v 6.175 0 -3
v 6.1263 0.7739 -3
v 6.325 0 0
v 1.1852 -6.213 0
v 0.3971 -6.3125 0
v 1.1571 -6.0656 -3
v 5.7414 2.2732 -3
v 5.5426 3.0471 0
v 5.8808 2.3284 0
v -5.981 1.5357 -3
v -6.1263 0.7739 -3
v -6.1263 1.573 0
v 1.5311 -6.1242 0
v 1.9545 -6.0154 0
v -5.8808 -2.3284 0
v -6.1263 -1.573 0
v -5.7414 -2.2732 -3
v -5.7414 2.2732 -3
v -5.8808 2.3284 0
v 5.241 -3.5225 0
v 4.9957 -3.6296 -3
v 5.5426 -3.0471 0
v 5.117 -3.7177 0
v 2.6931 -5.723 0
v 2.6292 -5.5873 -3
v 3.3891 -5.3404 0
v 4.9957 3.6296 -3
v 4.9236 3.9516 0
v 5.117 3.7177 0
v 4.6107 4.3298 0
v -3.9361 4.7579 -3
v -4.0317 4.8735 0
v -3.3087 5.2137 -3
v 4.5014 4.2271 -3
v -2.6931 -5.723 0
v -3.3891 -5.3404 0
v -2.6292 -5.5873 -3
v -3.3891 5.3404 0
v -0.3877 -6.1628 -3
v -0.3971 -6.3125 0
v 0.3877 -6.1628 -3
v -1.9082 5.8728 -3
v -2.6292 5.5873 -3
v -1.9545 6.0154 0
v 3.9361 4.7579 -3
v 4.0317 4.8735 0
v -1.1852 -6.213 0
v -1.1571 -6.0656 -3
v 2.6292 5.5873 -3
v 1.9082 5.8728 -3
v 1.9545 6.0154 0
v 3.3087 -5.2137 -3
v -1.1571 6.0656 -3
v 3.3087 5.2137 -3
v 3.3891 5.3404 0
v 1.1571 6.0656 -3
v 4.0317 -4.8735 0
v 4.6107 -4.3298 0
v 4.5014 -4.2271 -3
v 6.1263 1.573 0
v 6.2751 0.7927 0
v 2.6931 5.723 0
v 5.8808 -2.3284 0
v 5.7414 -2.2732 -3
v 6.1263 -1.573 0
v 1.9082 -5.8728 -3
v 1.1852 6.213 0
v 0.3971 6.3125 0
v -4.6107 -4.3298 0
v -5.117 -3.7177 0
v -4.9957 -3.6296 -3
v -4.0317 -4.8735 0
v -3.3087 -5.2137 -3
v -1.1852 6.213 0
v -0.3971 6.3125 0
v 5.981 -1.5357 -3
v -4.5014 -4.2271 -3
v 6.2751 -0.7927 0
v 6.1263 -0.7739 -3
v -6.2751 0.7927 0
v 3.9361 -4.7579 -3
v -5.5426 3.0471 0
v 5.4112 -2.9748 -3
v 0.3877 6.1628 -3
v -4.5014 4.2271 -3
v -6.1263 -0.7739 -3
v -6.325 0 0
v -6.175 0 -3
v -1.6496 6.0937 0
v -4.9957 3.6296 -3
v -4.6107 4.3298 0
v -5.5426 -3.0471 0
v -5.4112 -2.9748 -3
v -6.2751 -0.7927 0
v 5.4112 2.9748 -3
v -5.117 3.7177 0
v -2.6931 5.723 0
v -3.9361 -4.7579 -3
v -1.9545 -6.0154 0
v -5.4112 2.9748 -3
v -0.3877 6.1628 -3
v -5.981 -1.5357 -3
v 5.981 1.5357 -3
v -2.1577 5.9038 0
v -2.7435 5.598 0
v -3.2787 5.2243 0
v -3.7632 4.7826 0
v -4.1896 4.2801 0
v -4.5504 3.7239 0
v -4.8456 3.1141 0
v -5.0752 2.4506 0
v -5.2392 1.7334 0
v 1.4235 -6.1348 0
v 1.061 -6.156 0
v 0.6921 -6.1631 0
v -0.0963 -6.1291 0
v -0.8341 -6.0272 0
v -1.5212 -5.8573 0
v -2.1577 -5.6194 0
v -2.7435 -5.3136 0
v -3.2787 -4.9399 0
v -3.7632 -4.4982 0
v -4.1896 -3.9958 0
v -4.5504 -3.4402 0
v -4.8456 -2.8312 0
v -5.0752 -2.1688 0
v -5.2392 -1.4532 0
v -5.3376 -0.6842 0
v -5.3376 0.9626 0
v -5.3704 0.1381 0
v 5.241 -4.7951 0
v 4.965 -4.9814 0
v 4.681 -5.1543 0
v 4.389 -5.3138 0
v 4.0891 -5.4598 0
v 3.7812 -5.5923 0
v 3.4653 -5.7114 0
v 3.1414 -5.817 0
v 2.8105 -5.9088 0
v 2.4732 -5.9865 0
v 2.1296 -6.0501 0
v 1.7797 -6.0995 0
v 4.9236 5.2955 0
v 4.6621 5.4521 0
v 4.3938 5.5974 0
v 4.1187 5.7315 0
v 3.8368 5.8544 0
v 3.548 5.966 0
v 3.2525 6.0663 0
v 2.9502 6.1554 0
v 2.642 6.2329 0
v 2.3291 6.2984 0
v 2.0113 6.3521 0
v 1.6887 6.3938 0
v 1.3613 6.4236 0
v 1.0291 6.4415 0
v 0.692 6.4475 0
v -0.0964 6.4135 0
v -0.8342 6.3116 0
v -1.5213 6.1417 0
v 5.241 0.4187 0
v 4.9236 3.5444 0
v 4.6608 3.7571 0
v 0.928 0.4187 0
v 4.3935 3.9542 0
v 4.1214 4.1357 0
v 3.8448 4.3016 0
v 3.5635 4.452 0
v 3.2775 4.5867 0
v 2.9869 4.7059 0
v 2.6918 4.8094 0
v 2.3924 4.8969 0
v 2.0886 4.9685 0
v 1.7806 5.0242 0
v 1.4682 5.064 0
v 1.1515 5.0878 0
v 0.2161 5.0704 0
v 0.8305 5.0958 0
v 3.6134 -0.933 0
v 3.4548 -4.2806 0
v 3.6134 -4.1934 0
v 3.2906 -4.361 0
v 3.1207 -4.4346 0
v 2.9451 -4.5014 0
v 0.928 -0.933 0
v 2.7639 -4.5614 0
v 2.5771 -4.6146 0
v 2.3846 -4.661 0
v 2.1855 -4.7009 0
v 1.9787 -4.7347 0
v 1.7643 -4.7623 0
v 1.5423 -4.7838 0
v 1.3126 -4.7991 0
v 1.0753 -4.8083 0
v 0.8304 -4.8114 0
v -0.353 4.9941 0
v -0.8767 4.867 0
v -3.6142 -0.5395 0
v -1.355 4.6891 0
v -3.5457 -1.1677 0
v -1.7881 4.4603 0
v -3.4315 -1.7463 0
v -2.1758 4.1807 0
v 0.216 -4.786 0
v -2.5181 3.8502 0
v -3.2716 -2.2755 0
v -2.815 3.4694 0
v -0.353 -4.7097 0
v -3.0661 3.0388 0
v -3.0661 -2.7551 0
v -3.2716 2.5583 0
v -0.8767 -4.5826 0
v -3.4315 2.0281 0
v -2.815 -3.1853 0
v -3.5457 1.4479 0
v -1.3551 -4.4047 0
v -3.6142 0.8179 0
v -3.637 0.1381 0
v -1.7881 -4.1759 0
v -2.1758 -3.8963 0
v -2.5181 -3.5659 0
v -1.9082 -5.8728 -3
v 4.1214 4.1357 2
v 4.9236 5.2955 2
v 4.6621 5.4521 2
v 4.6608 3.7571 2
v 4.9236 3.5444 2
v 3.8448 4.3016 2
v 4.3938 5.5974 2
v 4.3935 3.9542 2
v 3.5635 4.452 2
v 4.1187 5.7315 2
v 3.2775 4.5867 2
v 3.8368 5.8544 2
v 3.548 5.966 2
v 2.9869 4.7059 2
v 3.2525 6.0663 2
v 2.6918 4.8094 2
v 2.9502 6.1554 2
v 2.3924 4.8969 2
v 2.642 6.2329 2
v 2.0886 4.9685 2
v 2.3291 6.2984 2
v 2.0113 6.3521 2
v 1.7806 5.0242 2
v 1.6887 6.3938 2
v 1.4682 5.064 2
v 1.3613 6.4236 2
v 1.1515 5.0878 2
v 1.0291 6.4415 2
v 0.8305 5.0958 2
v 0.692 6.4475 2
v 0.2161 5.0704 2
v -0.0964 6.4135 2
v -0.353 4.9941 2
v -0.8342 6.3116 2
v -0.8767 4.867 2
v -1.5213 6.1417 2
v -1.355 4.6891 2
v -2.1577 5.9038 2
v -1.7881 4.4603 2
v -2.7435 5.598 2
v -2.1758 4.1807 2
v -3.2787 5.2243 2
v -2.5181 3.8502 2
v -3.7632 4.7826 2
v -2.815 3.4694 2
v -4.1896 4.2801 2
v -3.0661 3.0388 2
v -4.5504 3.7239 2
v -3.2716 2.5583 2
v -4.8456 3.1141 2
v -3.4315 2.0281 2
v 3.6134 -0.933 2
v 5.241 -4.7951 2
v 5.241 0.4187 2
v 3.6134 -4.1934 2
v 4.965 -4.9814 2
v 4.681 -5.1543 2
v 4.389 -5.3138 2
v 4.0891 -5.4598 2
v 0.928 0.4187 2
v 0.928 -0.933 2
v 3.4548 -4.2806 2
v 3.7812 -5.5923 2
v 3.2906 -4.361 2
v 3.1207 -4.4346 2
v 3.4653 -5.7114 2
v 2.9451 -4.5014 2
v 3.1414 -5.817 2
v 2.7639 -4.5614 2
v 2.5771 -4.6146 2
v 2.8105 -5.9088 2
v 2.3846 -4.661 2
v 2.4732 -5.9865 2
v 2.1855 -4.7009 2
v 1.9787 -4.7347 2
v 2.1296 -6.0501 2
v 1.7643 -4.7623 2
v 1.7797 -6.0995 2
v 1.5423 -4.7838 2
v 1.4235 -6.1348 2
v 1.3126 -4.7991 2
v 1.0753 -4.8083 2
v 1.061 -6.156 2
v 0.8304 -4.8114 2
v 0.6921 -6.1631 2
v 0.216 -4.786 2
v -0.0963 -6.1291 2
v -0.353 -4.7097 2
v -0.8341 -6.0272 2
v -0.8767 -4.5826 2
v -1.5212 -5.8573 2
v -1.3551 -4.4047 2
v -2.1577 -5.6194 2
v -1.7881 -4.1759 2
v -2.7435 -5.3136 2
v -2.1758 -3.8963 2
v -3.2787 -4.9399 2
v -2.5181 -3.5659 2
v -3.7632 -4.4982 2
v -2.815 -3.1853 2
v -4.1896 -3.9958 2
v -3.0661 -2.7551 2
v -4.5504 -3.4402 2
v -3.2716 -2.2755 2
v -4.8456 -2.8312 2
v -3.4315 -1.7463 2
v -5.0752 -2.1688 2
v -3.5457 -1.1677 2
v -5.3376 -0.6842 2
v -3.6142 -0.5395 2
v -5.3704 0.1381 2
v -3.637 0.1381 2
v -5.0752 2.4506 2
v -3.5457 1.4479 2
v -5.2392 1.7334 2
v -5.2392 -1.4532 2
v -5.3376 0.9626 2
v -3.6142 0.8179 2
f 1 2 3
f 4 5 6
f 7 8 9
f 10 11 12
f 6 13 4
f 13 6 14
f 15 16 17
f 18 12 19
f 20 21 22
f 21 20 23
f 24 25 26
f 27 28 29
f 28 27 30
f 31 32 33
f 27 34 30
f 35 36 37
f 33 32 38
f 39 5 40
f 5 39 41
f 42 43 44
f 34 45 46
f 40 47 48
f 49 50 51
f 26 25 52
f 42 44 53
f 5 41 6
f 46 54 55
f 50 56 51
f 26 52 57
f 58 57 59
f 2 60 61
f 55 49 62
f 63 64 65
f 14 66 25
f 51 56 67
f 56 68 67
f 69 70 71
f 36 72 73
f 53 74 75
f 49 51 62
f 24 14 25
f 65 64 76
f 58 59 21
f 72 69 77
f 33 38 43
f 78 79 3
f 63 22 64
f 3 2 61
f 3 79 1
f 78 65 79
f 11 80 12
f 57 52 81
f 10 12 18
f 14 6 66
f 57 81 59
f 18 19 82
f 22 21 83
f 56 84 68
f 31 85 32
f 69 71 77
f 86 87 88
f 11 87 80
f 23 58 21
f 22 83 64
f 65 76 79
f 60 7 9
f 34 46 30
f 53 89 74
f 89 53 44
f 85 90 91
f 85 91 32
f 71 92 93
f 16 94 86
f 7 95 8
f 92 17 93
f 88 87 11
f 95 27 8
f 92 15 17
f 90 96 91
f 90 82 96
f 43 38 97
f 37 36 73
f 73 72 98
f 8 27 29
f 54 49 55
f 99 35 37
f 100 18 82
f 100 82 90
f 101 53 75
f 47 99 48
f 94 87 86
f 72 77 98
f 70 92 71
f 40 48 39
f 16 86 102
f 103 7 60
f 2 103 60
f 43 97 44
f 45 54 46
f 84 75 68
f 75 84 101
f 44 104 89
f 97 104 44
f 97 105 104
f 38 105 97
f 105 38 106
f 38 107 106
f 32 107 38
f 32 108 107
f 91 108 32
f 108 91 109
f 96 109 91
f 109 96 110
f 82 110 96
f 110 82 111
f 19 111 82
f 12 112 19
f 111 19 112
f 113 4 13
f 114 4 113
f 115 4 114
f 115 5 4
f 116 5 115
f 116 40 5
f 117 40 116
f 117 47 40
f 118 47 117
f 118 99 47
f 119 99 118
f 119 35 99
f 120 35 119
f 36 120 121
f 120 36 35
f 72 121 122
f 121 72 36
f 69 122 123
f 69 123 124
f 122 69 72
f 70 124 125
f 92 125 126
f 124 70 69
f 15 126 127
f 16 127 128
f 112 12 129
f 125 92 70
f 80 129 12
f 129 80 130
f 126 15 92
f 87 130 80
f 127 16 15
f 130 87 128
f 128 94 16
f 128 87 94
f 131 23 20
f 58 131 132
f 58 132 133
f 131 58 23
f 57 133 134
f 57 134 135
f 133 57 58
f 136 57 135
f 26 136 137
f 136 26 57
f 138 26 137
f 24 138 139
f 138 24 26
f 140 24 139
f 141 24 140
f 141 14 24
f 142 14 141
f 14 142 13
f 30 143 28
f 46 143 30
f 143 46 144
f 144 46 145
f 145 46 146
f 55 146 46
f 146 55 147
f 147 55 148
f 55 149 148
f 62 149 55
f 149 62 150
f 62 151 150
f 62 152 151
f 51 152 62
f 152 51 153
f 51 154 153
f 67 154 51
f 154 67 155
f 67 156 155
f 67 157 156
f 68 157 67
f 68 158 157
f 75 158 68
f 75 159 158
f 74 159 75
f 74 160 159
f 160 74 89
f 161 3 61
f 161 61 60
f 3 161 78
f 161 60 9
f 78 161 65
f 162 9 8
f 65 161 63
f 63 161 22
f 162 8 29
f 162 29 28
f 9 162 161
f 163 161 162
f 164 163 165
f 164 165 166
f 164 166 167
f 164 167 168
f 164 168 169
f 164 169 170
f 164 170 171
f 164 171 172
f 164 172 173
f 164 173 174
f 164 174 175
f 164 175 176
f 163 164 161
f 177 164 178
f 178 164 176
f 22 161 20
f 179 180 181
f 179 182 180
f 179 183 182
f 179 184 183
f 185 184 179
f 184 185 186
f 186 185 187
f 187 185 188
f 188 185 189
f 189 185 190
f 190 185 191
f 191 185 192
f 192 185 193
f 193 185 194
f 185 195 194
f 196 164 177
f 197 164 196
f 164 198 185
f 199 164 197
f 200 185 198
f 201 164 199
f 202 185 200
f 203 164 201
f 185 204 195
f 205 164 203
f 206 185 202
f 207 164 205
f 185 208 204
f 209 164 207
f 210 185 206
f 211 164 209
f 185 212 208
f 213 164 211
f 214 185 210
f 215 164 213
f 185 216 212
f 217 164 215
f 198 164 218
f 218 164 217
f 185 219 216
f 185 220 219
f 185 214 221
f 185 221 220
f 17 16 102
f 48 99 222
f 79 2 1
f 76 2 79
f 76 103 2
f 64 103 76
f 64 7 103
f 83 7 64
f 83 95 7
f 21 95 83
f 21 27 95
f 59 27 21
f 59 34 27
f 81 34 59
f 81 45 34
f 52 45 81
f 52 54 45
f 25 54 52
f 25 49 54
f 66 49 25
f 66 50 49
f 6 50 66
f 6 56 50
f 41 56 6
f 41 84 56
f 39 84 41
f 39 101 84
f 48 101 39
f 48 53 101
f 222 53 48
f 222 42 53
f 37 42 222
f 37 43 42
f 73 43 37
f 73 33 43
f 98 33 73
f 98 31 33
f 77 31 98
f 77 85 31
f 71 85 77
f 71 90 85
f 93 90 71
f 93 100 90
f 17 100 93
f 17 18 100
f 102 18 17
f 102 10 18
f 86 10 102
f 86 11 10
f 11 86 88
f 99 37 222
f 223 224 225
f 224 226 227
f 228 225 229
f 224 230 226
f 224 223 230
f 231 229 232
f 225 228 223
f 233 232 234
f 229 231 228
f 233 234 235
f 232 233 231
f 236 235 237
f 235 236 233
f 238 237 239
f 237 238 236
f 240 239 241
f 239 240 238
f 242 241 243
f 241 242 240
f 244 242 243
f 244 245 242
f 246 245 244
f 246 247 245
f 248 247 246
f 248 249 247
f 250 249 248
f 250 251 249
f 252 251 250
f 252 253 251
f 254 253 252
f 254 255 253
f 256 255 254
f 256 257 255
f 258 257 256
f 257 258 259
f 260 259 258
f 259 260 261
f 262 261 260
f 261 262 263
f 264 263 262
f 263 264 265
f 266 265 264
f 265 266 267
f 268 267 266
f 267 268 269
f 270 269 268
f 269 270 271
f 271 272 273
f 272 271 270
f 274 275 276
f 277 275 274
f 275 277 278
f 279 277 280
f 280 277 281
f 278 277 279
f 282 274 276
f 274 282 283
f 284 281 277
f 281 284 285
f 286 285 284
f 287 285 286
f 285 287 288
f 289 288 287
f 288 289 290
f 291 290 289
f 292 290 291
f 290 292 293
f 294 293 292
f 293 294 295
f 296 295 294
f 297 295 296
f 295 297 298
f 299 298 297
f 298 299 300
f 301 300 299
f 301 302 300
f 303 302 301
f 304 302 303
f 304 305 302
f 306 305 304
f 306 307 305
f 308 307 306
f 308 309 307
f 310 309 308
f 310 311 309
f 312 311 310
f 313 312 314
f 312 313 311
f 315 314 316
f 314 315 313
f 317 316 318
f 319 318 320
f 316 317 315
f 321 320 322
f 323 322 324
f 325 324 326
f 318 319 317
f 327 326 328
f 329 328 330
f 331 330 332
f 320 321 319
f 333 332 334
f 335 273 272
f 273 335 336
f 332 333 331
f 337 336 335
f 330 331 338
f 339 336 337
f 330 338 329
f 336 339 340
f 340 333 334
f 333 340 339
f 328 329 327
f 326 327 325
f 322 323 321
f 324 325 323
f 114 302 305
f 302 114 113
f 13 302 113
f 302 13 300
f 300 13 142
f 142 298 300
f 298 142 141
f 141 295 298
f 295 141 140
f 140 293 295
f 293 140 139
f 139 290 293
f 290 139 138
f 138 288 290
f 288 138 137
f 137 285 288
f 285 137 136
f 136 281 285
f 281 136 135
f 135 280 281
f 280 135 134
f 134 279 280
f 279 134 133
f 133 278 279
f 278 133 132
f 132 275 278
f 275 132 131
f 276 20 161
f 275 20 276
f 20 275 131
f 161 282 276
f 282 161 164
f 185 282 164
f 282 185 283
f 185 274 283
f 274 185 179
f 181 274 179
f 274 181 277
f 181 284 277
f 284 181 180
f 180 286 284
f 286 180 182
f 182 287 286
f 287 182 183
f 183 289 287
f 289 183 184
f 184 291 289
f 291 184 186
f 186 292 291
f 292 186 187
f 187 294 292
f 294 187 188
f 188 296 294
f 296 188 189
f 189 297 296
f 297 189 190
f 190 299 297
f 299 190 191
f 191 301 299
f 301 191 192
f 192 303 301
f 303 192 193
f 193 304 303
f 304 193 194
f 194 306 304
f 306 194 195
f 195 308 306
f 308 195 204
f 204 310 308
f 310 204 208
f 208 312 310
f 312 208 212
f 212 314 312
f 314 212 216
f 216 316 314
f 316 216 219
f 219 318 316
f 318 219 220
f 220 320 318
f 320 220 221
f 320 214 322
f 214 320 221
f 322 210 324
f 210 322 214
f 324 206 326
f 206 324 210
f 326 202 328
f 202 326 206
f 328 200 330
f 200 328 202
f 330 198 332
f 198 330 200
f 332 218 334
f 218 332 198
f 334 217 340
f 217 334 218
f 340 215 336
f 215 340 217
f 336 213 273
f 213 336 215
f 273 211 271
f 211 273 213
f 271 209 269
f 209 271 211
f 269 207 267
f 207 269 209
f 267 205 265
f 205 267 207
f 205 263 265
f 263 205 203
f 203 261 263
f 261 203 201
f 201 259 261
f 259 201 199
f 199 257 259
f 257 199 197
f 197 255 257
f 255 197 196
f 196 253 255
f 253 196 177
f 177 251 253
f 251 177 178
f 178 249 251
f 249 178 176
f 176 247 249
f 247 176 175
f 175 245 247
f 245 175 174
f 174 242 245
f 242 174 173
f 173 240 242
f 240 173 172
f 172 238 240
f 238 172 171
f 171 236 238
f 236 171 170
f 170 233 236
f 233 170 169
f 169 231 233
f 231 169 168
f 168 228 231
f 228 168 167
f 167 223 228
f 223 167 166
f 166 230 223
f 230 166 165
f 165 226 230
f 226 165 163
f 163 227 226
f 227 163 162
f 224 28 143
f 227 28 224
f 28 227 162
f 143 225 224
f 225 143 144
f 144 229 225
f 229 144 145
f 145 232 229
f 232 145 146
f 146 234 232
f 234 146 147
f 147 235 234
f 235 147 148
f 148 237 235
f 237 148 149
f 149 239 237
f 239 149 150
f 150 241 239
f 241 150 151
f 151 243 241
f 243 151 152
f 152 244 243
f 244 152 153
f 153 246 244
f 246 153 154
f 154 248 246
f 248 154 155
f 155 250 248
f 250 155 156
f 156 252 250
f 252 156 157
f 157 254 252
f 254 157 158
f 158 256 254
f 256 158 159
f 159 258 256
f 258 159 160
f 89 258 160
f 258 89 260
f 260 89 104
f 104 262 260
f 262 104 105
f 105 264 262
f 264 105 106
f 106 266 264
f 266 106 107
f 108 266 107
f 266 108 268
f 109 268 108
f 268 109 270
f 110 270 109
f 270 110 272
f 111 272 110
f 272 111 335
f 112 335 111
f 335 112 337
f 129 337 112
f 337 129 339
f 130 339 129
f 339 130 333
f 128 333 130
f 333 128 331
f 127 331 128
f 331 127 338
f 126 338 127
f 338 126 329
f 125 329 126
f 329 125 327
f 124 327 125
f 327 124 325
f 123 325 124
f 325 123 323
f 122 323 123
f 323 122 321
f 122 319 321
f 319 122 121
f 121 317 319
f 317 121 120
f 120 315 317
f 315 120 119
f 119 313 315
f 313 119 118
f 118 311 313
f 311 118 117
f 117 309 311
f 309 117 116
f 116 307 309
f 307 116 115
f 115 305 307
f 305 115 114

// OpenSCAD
$fn = 50;

difference() {
	union() {
		translate(v = [0, 0, -3.0]) {
			cylinder(h = 3, r1 = 6.175, r2 = 6.325);
		}
		linear_extrude(height = 2) {
			text(font = "Impact", halign = "center", size = 12, text = "G", valign = "center");
		}
	}
	union();
}
